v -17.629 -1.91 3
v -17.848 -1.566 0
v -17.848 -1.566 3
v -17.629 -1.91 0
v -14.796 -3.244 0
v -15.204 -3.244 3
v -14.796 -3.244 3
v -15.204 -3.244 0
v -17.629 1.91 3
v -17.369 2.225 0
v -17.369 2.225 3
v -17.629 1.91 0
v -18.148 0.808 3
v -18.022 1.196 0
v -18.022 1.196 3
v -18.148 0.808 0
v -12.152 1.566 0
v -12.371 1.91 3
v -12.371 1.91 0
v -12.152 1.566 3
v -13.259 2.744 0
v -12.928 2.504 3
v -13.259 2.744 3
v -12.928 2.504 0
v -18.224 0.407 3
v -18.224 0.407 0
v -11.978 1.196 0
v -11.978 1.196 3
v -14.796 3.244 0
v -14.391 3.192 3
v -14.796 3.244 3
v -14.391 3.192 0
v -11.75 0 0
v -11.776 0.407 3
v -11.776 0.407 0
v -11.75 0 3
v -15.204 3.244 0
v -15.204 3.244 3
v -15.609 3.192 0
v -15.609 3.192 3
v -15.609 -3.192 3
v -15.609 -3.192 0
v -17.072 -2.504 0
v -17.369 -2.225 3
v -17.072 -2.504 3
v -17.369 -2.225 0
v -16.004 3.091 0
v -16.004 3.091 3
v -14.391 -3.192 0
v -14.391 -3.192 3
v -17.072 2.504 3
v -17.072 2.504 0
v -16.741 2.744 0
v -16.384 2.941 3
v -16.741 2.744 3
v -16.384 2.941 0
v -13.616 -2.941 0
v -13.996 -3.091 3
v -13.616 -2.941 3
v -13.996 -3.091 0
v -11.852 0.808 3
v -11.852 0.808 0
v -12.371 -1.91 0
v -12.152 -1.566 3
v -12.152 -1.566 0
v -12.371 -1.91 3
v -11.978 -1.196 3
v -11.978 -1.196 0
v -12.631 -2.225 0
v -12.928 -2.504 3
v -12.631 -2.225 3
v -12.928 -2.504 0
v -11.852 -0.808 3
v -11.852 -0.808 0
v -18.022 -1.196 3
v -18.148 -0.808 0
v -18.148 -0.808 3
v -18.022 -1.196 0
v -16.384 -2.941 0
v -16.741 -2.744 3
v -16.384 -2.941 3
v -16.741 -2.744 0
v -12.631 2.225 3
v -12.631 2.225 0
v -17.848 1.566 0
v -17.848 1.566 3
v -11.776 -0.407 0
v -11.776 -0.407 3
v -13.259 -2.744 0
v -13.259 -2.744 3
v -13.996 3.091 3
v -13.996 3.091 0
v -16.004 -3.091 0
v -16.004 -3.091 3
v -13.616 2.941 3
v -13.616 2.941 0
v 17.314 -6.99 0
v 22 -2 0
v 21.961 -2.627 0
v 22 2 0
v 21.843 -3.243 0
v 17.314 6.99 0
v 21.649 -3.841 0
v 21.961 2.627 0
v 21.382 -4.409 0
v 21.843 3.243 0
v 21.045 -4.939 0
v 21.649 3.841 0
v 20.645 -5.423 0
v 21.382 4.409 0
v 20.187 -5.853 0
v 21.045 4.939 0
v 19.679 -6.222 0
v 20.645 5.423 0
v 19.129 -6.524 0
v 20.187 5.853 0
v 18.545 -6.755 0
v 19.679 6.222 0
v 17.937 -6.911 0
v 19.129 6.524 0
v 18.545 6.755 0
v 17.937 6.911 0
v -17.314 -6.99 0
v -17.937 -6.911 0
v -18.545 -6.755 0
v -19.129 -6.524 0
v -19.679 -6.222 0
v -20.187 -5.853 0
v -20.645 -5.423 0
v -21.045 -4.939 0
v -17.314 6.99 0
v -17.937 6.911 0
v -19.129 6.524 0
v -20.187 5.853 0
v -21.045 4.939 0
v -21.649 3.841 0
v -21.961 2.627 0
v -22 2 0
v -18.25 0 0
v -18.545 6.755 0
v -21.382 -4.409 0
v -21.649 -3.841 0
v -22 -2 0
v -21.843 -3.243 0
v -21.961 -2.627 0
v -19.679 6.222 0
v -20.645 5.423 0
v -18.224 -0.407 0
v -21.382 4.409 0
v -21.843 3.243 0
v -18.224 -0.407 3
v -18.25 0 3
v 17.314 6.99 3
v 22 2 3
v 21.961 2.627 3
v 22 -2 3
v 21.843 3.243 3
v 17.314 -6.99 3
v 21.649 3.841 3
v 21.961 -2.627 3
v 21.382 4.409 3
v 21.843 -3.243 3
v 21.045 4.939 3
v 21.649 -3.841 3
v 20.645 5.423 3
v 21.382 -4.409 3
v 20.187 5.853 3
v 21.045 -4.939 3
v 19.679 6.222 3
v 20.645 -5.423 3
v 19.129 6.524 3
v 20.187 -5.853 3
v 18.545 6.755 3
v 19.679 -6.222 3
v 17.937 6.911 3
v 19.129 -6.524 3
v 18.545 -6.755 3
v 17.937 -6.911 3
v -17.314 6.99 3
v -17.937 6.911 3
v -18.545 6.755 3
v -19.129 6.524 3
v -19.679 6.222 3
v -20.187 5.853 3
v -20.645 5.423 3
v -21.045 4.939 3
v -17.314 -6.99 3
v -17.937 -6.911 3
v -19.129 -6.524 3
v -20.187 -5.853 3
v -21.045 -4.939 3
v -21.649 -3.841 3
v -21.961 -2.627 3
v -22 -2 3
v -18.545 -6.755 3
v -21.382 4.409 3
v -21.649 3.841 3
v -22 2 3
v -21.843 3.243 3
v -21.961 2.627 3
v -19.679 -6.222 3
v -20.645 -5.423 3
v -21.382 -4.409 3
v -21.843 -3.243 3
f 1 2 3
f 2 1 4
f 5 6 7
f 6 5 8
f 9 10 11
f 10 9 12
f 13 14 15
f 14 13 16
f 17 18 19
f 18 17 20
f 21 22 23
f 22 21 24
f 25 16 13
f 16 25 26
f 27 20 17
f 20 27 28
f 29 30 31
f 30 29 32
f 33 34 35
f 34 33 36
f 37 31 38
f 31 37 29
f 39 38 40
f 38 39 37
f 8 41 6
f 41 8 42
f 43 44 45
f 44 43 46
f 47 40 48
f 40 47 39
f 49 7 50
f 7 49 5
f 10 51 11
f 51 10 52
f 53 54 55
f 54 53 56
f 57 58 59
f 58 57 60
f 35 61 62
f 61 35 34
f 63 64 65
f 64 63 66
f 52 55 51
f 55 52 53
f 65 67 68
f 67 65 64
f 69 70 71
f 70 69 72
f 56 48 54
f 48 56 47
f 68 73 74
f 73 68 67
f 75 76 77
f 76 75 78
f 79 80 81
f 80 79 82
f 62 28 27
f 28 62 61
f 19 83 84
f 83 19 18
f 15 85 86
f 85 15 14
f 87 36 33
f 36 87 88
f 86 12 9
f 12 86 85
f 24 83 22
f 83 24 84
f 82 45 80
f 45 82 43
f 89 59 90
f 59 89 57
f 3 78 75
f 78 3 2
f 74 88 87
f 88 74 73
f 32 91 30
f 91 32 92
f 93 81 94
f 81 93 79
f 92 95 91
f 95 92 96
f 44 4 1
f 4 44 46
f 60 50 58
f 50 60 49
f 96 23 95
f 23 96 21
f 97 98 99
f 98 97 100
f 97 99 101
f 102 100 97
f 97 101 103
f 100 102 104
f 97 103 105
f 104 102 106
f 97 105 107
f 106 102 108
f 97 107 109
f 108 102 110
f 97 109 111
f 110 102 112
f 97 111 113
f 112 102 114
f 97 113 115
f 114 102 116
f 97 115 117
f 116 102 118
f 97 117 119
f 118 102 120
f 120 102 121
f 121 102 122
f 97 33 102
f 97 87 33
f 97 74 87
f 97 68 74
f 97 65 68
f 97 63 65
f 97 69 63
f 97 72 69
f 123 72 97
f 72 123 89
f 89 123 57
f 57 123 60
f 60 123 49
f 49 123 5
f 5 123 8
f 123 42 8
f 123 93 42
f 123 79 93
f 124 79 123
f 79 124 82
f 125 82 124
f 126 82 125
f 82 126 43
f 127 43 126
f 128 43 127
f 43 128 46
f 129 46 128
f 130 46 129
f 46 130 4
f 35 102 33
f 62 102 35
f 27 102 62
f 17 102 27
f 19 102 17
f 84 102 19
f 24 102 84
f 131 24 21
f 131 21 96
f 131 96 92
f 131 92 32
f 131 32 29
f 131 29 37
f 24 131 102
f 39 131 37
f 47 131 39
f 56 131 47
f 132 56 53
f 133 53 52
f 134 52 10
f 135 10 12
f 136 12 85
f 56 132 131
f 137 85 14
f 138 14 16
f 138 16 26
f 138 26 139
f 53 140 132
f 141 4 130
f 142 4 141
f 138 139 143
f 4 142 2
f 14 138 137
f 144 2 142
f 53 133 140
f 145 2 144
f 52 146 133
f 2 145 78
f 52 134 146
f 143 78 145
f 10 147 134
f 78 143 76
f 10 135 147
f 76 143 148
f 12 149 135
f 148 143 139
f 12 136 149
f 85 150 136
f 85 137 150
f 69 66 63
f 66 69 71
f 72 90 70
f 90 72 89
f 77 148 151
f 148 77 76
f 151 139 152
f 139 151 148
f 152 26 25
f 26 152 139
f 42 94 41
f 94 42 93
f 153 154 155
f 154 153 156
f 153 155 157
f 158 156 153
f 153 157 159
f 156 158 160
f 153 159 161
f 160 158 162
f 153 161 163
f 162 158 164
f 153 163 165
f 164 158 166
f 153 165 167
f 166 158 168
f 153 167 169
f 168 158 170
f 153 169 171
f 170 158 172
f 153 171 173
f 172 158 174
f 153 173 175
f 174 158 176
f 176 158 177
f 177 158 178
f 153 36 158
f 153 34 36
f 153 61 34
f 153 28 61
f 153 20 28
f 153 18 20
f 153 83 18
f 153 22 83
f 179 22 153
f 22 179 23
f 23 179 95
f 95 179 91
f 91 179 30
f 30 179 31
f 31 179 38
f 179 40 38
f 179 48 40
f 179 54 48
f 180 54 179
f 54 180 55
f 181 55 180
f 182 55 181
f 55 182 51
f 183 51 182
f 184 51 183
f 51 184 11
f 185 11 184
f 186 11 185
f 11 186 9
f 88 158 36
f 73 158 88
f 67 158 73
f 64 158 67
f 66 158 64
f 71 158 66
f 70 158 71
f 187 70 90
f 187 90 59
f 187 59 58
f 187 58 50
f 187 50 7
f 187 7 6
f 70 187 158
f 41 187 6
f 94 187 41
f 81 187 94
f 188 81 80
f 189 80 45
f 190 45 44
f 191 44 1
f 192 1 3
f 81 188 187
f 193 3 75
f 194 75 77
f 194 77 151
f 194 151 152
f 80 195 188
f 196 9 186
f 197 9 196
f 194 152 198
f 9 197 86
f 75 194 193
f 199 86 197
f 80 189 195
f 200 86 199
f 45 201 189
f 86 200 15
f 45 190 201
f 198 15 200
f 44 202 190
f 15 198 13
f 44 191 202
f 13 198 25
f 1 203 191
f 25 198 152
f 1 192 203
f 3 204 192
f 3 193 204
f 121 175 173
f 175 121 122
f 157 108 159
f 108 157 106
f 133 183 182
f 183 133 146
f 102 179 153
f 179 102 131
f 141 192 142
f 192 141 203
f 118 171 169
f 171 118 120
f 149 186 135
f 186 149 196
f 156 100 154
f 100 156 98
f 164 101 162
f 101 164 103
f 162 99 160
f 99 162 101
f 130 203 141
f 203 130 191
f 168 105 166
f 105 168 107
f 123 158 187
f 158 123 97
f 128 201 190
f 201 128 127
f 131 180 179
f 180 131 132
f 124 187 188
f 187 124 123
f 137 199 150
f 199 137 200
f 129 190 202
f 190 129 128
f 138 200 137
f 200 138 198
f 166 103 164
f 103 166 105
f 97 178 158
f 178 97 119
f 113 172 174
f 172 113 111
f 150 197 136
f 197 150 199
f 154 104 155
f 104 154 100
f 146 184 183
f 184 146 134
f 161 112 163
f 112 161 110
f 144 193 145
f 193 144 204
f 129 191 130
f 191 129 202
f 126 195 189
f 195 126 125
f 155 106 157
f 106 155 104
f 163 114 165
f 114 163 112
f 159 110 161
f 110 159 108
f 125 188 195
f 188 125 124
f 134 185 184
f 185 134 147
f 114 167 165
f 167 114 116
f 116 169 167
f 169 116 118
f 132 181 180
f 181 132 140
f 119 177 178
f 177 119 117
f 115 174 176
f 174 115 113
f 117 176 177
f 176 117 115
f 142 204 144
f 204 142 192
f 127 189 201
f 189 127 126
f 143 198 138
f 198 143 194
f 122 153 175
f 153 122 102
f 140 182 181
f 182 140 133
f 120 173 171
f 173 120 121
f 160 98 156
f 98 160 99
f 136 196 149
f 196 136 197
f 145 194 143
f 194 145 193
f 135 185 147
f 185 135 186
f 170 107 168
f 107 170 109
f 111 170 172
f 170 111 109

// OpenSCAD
$fn = 50;


difference() {
	union() {
		hull() {
			translate(v = [-17.0000000000, 2.0000000000, 0]) {
				cylinder(h = 3, r = 5);
			}
			translate(v = [17.0000000000, 2.0000000000, 0]) {
				cylinder(h = 3, r = 5);
			}
			translate(v = [-17.0000000000, -2.0000000000, 0]) {
				cylinder(h = 3, r = 5);
			}
			translate(v = [17.0000000000, -2.0000000000, 0]) {
				cylinder(h = 3, r = 5);
			}
		}
	}
	union() {
		translate(v = [-15.0000000000, 0.0000000000, 0]) {
			cylinder(h = 3, r = 3.2500000000);
		}
		translate(v = [-15.0000000000, 0.0000000000, 0]) {
			cylinder(h = 3, r = 1.8000000000);
		}
		translate(v = [-15.0000000000, 0.0000000000, 0]) {
			cylinder(h = 3, r = 1.8000000000);
		}
		translate(v = [-15.0000000000, 0.0000000000, 0]) {
			cylinder(h = 3, r = 1.8000000000);
		}
	}
}
